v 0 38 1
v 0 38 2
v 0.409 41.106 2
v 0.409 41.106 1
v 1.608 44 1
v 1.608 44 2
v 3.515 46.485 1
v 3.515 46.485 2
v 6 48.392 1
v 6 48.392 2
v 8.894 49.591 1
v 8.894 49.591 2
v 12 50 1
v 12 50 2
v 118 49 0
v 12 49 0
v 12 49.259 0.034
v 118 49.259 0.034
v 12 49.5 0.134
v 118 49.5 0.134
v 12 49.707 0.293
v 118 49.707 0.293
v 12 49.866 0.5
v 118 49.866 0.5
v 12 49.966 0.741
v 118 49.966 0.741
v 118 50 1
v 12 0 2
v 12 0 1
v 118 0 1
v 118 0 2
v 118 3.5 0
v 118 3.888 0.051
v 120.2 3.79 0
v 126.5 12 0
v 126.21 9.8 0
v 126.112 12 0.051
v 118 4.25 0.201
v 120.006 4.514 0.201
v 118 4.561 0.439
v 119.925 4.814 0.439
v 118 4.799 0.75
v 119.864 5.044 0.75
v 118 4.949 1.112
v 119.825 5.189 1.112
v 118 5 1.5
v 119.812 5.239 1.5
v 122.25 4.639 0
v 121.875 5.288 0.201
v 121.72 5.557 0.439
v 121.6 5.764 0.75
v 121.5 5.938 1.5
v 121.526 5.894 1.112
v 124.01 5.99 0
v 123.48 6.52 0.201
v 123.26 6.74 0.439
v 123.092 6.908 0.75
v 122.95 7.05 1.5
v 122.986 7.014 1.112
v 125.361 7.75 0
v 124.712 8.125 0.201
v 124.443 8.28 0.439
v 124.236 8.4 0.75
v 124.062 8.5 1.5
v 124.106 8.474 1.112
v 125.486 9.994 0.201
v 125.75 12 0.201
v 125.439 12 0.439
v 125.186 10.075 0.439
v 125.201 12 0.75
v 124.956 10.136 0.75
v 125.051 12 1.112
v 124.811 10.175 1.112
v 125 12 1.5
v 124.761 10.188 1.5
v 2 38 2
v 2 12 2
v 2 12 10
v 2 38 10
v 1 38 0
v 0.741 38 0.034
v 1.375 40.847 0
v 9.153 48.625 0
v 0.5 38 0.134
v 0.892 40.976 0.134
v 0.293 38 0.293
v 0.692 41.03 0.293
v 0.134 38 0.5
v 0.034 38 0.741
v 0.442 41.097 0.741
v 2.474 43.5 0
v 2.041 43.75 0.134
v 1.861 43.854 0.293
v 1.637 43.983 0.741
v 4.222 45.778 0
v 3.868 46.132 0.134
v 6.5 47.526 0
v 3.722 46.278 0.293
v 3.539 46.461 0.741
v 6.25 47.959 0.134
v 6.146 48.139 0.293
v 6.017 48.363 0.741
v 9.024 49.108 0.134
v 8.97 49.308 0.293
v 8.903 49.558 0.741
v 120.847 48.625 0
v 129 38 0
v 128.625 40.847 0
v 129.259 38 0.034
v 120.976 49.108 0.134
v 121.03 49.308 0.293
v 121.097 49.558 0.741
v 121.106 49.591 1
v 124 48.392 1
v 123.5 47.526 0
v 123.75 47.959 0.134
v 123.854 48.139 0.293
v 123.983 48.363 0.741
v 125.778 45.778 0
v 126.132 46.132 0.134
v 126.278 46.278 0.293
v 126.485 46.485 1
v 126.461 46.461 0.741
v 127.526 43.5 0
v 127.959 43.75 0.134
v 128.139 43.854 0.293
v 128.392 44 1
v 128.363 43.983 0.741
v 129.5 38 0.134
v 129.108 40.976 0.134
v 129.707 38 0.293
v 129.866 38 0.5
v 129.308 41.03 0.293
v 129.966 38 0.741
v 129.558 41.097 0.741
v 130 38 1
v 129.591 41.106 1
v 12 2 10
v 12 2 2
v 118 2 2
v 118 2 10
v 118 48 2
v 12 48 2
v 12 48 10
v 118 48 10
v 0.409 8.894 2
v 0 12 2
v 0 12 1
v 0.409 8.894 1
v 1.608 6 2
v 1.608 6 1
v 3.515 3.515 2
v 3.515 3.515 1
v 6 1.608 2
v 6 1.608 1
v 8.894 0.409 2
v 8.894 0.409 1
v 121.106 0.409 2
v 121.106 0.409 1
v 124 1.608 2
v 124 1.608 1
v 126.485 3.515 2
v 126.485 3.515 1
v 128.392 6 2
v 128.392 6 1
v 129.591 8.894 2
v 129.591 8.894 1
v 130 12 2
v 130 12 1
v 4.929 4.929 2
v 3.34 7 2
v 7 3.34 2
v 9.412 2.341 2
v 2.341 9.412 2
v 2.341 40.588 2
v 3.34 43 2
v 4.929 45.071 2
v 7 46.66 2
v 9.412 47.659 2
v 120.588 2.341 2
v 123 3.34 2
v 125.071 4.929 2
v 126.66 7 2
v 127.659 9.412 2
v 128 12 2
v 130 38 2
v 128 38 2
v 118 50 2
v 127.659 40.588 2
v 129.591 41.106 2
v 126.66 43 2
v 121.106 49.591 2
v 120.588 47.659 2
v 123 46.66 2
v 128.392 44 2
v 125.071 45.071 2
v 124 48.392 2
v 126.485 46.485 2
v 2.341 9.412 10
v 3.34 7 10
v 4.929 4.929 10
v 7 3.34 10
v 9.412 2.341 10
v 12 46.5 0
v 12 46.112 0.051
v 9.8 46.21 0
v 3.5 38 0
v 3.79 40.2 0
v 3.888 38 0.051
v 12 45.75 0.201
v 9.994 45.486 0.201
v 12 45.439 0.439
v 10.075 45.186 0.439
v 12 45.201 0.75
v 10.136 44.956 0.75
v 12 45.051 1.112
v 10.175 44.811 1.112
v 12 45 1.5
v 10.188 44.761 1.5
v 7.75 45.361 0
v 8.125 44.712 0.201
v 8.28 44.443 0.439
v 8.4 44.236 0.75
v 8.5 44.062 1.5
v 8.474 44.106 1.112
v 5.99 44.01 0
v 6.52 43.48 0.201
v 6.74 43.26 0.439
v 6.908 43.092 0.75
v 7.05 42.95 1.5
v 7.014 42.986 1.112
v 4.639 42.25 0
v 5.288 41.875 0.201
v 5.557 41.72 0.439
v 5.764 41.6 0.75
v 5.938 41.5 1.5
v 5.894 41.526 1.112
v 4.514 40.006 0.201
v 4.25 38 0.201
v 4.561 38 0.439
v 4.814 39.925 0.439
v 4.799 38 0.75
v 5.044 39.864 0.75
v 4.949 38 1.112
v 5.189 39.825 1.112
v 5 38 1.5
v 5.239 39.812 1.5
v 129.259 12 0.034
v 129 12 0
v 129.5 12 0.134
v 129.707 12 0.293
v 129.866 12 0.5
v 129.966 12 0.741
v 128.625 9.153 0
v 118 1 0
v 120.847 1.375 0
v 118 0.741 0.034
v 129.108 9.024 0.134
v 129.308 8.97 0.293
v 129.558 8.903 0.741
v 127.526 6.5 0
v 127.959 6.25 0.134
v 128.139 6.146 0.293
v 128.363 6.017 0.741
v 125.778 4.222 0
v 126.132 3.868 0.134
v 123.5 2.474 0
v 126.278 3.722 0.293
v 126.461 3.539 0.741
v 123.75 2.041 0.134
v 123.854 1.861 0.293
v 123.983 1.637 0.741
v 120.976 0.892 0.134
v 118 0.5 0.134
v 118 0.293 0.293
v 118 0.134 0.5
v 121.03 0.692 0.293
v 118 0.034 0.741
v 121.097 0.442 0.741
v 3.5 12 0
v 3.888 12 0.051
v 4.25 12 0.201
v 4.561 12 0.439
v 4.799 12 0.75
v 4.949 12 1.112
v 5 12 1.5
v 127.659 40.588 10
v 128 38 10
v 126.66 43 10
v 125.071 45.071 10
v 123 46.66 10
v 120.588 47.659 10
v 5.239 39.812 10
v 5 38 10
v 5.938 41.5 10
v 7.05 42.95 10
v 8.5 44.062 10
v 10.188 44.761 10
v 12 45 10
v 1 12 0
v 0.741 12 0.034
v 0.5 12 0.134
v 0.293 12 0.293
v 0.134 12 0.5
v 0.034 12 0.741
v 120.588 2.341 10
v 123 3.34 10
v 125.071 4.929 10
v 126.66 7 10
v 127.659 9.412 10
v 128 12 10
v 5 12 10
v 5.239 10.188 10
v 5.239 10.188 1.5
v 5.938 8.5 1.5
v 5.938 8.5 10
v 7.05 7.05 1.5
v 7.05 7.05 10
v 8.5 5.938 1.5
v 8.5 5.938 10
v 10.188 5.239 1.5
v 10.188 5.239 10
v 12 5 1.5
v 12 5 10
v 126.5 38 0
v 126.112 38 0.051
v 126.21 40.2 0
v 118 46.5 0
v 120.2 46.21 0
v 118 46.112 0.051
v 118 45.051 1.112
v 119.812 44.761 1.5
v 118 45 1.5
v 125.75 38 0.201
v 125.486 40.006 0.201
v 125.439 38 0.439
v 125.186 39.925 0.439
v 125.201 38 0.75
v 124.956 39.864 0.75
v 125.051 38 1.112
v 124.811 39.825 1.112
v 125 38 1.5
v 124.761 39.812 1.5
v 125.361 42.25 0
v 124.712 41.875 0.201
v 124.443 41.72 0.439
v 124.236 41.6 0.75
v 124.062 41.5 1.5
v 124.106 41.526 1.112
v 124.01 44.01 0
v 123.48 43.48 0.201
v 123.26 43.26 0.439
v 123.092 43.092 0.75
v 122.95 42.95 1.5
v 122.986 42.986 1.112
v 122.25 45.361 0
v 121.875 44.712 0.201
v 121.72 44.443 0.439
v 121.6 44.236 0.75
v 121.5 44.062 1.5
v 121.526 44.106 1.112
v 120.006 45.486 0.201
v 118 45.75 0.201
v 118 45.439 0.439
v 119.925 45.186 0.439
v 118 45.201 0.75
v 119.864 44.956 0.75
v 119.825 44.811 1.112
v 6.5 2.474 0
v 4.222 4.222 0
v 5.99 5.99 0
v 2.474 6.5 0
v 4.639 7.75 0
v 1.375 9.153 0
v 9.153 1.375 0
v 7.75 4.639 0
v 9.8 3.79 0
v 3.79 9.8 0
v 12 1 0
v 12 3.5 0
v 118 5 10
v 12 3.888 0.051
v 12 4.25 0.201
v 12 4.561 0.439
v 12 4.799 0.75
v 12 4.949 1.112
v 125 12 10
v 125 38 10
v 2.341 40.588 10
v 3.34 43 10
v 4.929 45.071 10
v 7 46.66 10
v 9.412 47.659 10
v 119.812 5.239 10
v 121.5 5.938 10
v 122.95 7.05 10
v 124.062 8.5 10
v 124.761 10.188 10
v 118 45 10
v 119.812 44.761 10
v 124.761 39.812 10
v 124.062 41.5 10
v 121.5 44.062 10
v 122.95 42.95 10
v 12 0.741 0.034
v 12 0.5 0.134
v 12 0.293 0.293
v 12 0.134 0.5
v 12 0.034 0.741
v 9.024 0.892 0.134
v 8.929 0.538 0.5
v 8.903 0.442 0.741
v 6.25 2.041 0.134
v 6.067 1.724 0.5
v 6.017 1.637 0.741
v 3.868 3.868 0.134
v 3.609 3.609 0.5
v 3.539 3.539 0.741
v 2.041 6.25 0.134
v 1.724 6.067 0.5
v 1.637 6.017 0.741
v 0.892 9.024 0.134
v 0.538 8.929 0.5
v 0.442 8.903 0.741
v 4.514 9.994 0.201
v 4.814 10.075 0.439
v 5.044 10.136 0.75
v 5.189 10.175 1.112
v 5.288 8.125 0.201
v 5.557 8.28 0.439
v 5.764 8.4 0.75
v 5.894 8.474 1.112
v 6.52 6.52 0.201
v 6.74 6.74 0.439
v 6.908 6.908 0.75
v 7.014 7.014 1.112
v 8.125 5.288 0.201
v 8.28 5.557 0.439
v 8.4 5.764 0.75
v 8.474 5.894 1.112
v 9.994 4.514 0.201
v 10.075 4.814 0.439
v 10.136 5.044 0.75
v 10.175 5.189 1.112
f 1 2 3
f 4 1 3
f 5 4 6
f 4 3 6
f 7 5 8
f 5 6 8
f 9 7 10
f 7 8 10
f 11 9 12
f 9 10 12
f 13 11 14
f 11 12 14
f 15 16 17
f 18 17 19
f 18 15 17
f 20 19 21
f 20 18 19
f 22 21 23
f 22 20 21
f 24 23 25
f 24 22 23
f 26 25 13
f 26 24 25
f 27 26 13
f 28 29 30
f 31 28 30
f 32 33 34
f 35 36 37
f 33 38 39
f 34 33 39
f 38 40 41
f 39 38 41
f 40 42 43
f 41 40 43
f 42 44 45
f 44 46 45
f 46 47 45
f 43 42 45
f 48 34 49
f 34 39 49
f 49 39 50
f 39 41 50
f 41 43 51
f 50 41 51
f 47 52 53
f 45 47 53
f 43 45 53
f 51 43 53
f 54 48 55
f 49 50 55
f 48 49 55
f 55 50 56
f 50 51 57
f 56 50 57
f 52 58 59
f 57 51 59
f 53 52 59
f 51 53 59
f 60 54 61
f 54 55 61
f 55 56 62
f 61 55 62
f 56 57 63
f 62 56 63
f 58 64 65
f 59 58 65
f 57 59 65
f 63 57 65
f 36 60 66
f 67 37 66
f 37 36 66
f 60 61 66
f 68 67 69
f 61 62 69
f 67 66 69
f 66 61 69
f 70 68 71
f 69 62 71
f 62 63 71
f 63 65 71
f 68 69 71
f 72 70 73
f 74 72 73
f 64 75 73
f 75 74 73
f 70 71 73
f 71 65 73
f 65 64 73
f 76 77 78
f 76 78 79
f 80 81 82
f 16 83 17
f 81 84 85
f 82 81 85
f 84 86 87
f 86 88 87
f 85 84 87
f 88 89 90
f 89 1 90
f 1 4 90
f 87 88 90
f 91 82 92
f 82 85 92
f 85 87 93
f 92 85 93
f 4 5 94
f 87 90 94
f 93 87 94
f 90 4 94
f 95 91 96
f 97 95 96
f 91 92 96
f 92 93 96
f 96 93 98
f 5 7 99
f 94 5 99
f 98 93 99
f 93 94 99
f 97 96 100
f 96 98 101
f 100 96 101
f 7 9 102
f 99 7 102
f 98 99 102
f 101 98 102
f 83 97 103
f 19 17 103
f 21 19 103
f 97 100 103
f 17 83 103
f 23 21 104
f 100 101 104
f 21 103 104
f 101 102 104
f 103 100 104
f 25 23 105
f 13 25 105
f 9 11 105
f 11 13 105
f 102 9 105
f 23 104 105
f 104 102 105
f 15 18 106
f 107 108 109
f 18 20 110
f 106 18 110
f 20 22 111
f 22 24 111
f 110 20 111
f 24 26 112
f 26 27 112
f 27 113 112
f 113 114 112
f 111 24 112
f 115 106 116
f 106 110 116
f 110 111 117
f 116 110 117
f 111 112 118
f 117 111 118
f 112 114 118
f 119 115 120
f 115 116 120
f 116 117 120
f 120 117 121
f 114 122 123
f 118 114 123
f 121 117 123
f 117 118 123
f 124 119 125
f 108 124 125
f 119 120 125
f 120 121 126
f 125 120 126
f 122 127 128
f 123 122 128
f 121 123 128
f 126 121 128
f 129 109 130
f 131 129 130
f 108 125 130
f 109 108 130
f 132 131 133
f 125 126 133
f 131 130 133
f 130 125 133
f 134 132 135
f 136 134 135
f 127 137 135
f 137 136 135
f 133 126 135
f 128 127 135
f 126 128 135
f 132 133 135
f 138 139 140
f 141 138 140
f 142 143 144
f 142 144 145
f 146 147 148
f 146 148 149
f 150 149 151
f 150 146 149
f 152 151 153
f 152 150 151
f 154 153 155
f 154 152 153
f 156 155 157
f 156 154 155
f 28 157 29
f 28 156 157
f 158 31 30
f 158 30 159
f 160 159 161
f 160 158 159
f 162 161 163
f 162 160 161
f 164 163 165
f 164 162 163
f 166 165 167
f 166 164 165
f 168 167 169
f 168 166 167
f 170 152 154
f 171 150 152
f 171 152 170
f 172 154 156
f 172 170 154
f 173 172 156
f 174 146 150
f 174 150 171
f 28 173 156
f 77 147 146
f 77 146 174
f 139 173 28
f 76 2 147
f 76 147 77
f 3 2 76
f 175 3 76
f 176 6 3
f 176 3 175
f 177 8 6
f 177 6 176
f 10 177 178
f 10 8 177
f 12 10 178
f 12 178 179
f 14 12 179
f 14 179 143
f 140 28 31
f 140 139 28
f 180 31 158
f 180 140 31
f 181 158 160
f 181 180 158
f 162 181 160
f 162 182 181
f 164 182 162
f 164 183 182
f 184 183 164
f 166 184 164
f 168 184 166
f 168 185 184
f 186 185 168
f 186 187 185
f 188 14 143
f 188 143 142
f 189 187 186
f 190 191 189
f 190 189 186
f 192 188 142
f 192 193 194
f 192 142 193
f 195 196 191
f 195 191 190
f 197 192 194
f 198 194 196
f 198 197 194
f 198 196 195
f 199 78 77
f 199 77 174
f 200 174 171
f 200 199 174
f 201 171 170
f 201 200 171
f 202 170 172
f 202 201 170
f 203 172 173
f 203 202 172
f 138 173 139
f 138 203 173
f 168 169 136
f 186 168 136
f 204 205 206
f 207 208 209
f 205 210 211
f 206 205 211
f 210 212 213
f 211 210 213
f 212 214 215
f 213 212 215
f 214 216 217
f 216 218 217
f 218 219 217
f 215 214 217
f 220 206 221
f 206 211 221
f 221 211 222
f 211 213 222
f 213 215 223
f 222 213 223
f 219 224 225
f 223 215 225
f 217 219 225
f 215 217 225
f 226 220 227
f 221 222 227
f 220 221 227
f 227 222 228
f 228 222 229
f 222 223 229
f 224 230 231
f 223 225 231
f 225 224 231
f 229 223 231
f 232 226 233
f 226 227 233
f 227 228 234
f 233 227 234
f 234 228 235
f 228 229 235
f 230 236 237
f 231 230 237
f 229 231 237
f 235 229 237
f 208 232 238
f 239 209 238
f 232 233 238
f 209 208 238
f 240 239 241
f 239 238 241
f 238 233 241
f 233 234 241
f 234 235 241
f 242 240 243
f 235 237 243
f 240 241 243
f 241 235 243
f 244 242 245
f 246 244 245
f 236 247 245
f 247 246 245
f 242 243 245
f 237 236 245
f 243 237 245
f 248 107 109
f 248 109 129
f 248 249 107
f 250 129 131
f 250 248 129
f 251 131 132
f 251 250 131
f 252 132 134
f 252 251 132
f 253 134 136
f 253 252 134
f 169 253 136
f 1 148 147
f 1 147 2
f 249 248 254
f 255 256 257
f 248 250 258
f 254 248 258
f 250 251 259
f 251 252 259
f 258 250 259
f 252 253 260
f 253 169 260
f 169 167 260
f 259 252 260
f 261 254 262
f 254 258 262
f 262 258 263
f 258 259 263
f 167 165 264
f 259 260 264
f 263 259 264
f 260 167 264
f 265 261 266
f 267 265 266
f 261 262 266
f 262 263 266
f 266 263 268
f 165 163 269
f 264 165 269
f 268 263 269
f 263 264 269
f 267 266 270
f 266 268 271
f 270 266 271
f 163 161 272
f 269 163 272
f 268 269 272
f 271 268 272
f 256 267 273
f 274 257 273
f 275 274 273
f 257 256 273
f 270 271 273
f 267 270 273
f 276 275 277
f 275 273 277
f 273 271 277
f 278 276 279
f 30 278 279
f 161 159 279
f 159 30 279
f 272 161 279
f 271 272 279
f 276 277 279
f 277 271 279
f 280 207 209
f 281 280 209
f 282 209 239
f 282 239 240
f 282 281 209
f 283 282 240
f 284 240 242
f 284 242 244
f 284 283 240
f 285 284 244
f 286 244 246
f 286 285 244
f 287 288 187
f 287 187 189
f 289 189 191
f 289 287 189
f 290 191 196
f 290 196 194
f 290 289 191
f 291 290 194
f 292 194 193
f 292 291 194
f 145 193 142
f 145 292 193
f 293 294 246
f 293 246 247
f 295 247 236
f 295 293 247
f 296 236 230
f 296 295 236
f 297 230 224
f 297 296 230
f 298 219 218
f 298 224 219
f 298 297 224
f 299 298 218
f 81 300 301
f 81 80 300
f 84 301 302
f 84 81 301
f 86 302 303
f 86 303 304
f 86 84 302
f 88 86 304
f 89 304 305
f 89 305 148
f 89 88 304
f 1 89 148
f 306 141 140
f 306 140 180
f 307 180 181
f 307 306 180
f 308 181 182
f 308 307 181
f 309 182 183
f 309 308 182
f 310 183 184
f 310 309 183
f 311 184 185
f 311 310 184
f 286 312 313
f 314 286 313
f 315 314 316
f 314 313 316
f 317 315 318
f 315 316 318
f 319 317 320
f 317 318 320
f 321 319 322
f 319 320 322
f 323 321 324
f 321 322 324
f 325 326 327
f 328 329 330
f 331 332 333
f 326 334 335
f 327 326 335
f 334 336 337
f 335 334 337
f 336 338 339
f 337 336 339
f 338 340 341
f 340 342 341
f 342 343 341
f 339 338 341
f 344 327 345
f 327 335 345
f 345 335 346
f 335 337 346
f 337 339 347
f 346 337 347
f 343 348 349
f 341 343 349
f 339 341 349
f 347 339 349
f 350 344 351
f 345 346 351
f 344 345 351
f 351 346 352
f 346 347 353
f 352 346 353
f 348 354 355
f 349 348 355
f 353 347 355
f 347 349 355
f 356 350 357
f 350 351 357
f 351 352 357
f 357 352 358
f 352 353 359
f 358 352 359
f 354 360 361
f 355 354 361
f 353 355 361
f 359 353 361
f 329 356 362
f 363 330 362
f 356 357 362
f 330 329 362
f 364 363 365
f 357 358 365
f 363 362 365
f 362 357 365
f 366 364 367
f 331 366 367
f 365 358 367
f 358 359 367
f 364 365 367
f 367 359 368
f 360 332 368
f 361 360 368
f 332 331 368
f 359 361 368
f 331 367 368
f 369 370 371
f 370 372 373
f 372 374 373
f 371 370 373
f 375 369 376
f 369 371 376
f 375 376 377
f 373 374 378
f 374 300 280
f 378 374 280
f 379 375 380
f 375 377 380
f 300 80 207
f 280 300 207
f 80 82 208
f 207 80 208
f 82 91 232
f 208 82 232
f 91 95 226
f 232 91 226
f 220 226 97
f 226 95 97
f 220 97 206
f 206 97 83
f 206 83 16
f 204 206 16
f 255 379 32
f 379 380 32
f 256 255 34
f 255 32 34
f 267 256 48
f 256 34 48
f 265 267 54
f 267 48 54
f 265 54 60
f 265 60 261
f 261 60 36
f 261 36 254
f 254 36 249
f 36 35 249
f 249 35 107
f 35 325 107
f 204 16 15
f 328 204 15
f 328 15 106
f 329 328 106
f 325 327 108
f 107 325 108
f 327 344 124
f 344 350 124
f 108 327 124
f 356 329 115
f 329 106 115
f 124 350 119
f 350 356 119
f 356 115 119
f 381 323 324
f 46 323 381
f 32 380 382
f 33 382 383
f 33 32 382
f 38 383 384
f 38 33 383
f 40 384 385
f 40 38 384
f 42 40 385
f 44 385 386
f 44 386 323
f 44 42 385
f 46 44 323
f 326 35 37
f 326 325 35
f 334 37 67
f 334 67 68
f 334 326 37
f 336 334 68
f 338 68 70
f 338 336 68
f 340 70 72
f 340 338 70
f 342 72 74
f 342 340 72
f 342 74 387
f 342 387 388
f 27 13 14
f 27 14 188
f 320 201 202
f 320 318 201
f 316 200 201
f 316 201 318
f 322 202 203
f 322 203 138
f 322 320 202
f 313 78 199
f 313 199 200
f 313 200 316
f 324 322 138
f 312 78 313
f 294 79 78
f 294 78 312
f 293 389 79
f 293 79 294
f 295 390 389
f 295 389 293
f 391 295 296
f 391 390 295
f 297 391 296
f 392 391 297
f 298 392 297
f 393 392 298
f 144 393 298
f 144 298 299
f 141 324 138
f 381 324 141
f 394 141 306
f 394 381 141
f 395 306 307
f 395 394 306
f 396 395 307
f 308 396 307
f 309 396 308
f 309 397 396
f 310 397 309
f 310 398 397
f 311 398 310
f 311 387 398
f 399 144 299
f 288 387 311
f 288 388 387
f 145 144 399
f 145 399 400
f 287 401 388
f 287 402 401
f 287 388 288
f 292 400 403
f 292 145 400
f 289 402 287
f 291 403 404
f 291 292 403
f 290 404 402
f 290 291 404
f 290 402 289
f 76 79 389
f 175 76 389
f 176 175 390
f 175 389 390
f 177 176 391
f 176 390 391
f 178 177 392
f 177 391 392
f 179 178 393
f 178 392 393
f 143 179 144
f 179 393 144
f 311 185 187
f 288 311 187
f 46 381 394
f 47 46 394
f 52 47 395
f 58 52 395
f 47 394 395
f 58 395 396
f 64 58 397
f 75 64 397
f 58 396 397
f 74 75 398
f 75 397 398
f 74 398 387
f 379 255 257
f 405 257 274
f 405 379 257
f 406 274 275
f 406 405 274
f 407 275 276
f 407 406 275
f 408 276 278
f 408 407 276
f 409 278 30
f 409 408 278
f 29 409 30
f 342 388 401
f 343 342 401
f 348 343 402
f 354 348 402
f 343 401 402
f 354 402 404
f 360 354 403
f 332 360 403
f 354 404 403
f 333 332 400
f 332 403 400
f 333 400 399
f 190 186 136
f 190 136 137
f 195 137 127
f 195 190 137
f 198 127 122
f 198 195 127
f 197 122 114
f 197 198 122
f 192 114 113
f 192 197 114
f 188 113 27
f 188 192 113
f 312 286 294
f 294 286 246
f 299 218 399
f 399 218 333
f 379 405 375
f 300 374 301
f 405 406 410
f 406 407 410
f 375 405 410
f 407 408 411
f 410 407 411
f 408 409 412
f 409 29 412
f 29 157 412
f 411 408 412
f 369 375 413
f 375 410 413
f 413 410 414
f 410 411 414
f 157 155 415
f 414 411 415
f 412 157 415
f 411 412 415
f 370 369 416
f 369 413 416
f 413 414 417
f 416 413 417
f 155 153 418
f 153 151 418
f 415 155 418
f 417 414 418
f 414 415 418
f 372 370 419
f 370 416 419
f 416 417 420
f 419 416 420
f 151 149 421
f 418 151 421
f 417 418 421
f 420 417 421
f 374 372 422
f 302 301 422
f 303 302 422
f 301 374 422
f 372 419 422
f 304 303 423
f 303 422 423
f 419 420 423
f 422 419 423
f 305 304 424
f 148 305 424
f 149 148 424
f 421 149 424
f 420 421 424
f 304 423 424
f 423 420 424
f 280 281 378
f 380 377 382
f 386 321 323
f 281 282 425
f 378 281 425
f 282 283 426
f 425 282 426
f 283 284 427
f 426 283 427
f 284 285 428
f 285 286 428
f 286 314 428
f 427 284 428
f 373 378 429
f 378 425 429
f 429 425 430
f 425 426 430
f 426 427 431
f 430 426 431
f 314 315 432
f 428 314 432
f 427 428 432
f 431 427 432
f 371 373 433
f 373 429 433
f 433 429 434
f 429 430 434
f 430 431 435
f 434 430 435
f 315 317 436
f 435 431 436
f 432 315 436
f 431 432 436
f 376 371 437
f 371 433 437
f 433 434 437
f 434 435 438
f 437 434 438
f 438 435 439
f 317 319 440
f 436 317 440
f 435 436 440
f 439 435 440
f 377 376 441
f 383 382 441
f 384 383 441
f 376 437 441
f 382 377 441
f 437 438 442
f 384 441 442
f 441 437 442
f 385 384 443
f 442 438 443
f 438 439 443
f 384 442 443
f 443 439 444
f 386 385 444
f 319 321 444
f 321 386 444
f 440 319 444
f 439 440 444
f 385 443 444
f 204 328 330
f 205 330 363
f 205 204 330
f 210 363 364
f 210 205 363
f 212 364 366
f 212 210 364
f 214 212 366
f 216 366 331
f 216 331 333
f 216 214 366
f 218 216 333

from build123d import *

# Parameters (mm, degrees)
BOX_W        = 120
BOX_H        = 40
BOX_DEPTH    = 10
FILLET_R     = 7
BOX002_W     = 130
BOX002_H     = 50
BOX002_DEPTH = 2
FILLET002_R  = 12
BOX001_W     = 126
BOX001_H     = 46
BOX001_DEPTH = 10
FILLET001_R  = 10
FILLET003_R  = 1.5
FILLET004_R  = 1


with BuildPart() as fillet_body:
    # Box → Box (new body)
    with BuildSketch(Plane.XY):
        with Locations((60, 20)):
            Rectangle(BOX_W, BOX_H)
    extrude(amount=BOX_DEPTH)

    # Fillet
    fillet_edges = [fillet_body.edges().sort_by_distance(p)[0] for p in [
        (0, 0, 5),
        (0, 40, 5),
        (120, 0, 5),
        (120, 40, 5),
    ]]
    fillet(fillet_edges, radius=FILLET_R)


with BuildPart() as fillet_body_1:
    # Fillet placement: moved
    add(fillet_body.part.moved(Location((5, 5, 0))))


with BuildPart() as fillet002:
    # Box002 → Box002 (new body)
    with BuildSketch(Plane.XY):
        with Locations((65, 25)):
            Rectangle(BOX002_W, BOX002_H)
    extrude(amount=BOX002_DEPTH)

    # Fillet002
    fillet002_edges = [fillet002.edges().sort_by_distance(p)[0] for p in [
        (0, 0, 1),
        (0, 50, 1),
        (130, 0, 1),
        (130, 50, 1),
    ]]
    fillet(fillet002_edges, radius=FILLET002_R)


with BuildPart() as fillet004:
    # Box001 → Box001 (new body)
    with BuildSketch(Plane.XY):
        with Locations((63, 23)):
            Rectangle(BOX001_W, BOX001_H)
    extrude(amount=BOX001_DEPTH)

    # Fillet001
    fillet001_edges = [fillet004.edges().sort_by_distance(p)[0] for p in [
        (0, 0, 5),
        (0, 46, 5),
        (126, 0, 5),
        (126, 46, 5),
    ]]
    fillet(fillet001_edges, radius=FILLET001_R)


with BuildPart() as fillet004_1:
    # Fillet001 placement: moved
    add(fillet004.part.moved(Location((2, 2, 0))))

    # Fusion: union Fillet002
    add(fillet002.part)

    # Cut: cut Fillet body
    add(fillet_body_1.part, mode=Mode.SUBTRACT)

    # Fillet003
    fillet003_edges = [fillet004_1.edges().sort_by_distance(p)[0] for p in [
        (7.050253, 7.050253, 0),
        (65, 5, 0),
        (122.949747, 7.050253, 0),
        (125, 25, 0),
        (122.949747, 42.949747, 0),
        (65, 45, 0),
        (7.050253, 42.949747, 0),
        (5, 25, 0),
    ]]
    fillet(fillet003_edges, radius=FILLET003_R)

    # Fillet004
    fillet004_edges = [fillet004_1.edges().sort_by_distance(p)[0] for p in [
        (0, 25, 0),
        (3.514719, 3.514719, 0),
        (3.514719, 46.485281, 0),
        (65, 0, 0),
        (65, 50, 0),
        (126.485281, 3.514719, 0),
        (126.485281, 46.485281, 0),
        (130, 25, 0),
    ]]
    fillet(fillet004_edges, radius=FILLET004_R)


solid = fillet004_1.part
